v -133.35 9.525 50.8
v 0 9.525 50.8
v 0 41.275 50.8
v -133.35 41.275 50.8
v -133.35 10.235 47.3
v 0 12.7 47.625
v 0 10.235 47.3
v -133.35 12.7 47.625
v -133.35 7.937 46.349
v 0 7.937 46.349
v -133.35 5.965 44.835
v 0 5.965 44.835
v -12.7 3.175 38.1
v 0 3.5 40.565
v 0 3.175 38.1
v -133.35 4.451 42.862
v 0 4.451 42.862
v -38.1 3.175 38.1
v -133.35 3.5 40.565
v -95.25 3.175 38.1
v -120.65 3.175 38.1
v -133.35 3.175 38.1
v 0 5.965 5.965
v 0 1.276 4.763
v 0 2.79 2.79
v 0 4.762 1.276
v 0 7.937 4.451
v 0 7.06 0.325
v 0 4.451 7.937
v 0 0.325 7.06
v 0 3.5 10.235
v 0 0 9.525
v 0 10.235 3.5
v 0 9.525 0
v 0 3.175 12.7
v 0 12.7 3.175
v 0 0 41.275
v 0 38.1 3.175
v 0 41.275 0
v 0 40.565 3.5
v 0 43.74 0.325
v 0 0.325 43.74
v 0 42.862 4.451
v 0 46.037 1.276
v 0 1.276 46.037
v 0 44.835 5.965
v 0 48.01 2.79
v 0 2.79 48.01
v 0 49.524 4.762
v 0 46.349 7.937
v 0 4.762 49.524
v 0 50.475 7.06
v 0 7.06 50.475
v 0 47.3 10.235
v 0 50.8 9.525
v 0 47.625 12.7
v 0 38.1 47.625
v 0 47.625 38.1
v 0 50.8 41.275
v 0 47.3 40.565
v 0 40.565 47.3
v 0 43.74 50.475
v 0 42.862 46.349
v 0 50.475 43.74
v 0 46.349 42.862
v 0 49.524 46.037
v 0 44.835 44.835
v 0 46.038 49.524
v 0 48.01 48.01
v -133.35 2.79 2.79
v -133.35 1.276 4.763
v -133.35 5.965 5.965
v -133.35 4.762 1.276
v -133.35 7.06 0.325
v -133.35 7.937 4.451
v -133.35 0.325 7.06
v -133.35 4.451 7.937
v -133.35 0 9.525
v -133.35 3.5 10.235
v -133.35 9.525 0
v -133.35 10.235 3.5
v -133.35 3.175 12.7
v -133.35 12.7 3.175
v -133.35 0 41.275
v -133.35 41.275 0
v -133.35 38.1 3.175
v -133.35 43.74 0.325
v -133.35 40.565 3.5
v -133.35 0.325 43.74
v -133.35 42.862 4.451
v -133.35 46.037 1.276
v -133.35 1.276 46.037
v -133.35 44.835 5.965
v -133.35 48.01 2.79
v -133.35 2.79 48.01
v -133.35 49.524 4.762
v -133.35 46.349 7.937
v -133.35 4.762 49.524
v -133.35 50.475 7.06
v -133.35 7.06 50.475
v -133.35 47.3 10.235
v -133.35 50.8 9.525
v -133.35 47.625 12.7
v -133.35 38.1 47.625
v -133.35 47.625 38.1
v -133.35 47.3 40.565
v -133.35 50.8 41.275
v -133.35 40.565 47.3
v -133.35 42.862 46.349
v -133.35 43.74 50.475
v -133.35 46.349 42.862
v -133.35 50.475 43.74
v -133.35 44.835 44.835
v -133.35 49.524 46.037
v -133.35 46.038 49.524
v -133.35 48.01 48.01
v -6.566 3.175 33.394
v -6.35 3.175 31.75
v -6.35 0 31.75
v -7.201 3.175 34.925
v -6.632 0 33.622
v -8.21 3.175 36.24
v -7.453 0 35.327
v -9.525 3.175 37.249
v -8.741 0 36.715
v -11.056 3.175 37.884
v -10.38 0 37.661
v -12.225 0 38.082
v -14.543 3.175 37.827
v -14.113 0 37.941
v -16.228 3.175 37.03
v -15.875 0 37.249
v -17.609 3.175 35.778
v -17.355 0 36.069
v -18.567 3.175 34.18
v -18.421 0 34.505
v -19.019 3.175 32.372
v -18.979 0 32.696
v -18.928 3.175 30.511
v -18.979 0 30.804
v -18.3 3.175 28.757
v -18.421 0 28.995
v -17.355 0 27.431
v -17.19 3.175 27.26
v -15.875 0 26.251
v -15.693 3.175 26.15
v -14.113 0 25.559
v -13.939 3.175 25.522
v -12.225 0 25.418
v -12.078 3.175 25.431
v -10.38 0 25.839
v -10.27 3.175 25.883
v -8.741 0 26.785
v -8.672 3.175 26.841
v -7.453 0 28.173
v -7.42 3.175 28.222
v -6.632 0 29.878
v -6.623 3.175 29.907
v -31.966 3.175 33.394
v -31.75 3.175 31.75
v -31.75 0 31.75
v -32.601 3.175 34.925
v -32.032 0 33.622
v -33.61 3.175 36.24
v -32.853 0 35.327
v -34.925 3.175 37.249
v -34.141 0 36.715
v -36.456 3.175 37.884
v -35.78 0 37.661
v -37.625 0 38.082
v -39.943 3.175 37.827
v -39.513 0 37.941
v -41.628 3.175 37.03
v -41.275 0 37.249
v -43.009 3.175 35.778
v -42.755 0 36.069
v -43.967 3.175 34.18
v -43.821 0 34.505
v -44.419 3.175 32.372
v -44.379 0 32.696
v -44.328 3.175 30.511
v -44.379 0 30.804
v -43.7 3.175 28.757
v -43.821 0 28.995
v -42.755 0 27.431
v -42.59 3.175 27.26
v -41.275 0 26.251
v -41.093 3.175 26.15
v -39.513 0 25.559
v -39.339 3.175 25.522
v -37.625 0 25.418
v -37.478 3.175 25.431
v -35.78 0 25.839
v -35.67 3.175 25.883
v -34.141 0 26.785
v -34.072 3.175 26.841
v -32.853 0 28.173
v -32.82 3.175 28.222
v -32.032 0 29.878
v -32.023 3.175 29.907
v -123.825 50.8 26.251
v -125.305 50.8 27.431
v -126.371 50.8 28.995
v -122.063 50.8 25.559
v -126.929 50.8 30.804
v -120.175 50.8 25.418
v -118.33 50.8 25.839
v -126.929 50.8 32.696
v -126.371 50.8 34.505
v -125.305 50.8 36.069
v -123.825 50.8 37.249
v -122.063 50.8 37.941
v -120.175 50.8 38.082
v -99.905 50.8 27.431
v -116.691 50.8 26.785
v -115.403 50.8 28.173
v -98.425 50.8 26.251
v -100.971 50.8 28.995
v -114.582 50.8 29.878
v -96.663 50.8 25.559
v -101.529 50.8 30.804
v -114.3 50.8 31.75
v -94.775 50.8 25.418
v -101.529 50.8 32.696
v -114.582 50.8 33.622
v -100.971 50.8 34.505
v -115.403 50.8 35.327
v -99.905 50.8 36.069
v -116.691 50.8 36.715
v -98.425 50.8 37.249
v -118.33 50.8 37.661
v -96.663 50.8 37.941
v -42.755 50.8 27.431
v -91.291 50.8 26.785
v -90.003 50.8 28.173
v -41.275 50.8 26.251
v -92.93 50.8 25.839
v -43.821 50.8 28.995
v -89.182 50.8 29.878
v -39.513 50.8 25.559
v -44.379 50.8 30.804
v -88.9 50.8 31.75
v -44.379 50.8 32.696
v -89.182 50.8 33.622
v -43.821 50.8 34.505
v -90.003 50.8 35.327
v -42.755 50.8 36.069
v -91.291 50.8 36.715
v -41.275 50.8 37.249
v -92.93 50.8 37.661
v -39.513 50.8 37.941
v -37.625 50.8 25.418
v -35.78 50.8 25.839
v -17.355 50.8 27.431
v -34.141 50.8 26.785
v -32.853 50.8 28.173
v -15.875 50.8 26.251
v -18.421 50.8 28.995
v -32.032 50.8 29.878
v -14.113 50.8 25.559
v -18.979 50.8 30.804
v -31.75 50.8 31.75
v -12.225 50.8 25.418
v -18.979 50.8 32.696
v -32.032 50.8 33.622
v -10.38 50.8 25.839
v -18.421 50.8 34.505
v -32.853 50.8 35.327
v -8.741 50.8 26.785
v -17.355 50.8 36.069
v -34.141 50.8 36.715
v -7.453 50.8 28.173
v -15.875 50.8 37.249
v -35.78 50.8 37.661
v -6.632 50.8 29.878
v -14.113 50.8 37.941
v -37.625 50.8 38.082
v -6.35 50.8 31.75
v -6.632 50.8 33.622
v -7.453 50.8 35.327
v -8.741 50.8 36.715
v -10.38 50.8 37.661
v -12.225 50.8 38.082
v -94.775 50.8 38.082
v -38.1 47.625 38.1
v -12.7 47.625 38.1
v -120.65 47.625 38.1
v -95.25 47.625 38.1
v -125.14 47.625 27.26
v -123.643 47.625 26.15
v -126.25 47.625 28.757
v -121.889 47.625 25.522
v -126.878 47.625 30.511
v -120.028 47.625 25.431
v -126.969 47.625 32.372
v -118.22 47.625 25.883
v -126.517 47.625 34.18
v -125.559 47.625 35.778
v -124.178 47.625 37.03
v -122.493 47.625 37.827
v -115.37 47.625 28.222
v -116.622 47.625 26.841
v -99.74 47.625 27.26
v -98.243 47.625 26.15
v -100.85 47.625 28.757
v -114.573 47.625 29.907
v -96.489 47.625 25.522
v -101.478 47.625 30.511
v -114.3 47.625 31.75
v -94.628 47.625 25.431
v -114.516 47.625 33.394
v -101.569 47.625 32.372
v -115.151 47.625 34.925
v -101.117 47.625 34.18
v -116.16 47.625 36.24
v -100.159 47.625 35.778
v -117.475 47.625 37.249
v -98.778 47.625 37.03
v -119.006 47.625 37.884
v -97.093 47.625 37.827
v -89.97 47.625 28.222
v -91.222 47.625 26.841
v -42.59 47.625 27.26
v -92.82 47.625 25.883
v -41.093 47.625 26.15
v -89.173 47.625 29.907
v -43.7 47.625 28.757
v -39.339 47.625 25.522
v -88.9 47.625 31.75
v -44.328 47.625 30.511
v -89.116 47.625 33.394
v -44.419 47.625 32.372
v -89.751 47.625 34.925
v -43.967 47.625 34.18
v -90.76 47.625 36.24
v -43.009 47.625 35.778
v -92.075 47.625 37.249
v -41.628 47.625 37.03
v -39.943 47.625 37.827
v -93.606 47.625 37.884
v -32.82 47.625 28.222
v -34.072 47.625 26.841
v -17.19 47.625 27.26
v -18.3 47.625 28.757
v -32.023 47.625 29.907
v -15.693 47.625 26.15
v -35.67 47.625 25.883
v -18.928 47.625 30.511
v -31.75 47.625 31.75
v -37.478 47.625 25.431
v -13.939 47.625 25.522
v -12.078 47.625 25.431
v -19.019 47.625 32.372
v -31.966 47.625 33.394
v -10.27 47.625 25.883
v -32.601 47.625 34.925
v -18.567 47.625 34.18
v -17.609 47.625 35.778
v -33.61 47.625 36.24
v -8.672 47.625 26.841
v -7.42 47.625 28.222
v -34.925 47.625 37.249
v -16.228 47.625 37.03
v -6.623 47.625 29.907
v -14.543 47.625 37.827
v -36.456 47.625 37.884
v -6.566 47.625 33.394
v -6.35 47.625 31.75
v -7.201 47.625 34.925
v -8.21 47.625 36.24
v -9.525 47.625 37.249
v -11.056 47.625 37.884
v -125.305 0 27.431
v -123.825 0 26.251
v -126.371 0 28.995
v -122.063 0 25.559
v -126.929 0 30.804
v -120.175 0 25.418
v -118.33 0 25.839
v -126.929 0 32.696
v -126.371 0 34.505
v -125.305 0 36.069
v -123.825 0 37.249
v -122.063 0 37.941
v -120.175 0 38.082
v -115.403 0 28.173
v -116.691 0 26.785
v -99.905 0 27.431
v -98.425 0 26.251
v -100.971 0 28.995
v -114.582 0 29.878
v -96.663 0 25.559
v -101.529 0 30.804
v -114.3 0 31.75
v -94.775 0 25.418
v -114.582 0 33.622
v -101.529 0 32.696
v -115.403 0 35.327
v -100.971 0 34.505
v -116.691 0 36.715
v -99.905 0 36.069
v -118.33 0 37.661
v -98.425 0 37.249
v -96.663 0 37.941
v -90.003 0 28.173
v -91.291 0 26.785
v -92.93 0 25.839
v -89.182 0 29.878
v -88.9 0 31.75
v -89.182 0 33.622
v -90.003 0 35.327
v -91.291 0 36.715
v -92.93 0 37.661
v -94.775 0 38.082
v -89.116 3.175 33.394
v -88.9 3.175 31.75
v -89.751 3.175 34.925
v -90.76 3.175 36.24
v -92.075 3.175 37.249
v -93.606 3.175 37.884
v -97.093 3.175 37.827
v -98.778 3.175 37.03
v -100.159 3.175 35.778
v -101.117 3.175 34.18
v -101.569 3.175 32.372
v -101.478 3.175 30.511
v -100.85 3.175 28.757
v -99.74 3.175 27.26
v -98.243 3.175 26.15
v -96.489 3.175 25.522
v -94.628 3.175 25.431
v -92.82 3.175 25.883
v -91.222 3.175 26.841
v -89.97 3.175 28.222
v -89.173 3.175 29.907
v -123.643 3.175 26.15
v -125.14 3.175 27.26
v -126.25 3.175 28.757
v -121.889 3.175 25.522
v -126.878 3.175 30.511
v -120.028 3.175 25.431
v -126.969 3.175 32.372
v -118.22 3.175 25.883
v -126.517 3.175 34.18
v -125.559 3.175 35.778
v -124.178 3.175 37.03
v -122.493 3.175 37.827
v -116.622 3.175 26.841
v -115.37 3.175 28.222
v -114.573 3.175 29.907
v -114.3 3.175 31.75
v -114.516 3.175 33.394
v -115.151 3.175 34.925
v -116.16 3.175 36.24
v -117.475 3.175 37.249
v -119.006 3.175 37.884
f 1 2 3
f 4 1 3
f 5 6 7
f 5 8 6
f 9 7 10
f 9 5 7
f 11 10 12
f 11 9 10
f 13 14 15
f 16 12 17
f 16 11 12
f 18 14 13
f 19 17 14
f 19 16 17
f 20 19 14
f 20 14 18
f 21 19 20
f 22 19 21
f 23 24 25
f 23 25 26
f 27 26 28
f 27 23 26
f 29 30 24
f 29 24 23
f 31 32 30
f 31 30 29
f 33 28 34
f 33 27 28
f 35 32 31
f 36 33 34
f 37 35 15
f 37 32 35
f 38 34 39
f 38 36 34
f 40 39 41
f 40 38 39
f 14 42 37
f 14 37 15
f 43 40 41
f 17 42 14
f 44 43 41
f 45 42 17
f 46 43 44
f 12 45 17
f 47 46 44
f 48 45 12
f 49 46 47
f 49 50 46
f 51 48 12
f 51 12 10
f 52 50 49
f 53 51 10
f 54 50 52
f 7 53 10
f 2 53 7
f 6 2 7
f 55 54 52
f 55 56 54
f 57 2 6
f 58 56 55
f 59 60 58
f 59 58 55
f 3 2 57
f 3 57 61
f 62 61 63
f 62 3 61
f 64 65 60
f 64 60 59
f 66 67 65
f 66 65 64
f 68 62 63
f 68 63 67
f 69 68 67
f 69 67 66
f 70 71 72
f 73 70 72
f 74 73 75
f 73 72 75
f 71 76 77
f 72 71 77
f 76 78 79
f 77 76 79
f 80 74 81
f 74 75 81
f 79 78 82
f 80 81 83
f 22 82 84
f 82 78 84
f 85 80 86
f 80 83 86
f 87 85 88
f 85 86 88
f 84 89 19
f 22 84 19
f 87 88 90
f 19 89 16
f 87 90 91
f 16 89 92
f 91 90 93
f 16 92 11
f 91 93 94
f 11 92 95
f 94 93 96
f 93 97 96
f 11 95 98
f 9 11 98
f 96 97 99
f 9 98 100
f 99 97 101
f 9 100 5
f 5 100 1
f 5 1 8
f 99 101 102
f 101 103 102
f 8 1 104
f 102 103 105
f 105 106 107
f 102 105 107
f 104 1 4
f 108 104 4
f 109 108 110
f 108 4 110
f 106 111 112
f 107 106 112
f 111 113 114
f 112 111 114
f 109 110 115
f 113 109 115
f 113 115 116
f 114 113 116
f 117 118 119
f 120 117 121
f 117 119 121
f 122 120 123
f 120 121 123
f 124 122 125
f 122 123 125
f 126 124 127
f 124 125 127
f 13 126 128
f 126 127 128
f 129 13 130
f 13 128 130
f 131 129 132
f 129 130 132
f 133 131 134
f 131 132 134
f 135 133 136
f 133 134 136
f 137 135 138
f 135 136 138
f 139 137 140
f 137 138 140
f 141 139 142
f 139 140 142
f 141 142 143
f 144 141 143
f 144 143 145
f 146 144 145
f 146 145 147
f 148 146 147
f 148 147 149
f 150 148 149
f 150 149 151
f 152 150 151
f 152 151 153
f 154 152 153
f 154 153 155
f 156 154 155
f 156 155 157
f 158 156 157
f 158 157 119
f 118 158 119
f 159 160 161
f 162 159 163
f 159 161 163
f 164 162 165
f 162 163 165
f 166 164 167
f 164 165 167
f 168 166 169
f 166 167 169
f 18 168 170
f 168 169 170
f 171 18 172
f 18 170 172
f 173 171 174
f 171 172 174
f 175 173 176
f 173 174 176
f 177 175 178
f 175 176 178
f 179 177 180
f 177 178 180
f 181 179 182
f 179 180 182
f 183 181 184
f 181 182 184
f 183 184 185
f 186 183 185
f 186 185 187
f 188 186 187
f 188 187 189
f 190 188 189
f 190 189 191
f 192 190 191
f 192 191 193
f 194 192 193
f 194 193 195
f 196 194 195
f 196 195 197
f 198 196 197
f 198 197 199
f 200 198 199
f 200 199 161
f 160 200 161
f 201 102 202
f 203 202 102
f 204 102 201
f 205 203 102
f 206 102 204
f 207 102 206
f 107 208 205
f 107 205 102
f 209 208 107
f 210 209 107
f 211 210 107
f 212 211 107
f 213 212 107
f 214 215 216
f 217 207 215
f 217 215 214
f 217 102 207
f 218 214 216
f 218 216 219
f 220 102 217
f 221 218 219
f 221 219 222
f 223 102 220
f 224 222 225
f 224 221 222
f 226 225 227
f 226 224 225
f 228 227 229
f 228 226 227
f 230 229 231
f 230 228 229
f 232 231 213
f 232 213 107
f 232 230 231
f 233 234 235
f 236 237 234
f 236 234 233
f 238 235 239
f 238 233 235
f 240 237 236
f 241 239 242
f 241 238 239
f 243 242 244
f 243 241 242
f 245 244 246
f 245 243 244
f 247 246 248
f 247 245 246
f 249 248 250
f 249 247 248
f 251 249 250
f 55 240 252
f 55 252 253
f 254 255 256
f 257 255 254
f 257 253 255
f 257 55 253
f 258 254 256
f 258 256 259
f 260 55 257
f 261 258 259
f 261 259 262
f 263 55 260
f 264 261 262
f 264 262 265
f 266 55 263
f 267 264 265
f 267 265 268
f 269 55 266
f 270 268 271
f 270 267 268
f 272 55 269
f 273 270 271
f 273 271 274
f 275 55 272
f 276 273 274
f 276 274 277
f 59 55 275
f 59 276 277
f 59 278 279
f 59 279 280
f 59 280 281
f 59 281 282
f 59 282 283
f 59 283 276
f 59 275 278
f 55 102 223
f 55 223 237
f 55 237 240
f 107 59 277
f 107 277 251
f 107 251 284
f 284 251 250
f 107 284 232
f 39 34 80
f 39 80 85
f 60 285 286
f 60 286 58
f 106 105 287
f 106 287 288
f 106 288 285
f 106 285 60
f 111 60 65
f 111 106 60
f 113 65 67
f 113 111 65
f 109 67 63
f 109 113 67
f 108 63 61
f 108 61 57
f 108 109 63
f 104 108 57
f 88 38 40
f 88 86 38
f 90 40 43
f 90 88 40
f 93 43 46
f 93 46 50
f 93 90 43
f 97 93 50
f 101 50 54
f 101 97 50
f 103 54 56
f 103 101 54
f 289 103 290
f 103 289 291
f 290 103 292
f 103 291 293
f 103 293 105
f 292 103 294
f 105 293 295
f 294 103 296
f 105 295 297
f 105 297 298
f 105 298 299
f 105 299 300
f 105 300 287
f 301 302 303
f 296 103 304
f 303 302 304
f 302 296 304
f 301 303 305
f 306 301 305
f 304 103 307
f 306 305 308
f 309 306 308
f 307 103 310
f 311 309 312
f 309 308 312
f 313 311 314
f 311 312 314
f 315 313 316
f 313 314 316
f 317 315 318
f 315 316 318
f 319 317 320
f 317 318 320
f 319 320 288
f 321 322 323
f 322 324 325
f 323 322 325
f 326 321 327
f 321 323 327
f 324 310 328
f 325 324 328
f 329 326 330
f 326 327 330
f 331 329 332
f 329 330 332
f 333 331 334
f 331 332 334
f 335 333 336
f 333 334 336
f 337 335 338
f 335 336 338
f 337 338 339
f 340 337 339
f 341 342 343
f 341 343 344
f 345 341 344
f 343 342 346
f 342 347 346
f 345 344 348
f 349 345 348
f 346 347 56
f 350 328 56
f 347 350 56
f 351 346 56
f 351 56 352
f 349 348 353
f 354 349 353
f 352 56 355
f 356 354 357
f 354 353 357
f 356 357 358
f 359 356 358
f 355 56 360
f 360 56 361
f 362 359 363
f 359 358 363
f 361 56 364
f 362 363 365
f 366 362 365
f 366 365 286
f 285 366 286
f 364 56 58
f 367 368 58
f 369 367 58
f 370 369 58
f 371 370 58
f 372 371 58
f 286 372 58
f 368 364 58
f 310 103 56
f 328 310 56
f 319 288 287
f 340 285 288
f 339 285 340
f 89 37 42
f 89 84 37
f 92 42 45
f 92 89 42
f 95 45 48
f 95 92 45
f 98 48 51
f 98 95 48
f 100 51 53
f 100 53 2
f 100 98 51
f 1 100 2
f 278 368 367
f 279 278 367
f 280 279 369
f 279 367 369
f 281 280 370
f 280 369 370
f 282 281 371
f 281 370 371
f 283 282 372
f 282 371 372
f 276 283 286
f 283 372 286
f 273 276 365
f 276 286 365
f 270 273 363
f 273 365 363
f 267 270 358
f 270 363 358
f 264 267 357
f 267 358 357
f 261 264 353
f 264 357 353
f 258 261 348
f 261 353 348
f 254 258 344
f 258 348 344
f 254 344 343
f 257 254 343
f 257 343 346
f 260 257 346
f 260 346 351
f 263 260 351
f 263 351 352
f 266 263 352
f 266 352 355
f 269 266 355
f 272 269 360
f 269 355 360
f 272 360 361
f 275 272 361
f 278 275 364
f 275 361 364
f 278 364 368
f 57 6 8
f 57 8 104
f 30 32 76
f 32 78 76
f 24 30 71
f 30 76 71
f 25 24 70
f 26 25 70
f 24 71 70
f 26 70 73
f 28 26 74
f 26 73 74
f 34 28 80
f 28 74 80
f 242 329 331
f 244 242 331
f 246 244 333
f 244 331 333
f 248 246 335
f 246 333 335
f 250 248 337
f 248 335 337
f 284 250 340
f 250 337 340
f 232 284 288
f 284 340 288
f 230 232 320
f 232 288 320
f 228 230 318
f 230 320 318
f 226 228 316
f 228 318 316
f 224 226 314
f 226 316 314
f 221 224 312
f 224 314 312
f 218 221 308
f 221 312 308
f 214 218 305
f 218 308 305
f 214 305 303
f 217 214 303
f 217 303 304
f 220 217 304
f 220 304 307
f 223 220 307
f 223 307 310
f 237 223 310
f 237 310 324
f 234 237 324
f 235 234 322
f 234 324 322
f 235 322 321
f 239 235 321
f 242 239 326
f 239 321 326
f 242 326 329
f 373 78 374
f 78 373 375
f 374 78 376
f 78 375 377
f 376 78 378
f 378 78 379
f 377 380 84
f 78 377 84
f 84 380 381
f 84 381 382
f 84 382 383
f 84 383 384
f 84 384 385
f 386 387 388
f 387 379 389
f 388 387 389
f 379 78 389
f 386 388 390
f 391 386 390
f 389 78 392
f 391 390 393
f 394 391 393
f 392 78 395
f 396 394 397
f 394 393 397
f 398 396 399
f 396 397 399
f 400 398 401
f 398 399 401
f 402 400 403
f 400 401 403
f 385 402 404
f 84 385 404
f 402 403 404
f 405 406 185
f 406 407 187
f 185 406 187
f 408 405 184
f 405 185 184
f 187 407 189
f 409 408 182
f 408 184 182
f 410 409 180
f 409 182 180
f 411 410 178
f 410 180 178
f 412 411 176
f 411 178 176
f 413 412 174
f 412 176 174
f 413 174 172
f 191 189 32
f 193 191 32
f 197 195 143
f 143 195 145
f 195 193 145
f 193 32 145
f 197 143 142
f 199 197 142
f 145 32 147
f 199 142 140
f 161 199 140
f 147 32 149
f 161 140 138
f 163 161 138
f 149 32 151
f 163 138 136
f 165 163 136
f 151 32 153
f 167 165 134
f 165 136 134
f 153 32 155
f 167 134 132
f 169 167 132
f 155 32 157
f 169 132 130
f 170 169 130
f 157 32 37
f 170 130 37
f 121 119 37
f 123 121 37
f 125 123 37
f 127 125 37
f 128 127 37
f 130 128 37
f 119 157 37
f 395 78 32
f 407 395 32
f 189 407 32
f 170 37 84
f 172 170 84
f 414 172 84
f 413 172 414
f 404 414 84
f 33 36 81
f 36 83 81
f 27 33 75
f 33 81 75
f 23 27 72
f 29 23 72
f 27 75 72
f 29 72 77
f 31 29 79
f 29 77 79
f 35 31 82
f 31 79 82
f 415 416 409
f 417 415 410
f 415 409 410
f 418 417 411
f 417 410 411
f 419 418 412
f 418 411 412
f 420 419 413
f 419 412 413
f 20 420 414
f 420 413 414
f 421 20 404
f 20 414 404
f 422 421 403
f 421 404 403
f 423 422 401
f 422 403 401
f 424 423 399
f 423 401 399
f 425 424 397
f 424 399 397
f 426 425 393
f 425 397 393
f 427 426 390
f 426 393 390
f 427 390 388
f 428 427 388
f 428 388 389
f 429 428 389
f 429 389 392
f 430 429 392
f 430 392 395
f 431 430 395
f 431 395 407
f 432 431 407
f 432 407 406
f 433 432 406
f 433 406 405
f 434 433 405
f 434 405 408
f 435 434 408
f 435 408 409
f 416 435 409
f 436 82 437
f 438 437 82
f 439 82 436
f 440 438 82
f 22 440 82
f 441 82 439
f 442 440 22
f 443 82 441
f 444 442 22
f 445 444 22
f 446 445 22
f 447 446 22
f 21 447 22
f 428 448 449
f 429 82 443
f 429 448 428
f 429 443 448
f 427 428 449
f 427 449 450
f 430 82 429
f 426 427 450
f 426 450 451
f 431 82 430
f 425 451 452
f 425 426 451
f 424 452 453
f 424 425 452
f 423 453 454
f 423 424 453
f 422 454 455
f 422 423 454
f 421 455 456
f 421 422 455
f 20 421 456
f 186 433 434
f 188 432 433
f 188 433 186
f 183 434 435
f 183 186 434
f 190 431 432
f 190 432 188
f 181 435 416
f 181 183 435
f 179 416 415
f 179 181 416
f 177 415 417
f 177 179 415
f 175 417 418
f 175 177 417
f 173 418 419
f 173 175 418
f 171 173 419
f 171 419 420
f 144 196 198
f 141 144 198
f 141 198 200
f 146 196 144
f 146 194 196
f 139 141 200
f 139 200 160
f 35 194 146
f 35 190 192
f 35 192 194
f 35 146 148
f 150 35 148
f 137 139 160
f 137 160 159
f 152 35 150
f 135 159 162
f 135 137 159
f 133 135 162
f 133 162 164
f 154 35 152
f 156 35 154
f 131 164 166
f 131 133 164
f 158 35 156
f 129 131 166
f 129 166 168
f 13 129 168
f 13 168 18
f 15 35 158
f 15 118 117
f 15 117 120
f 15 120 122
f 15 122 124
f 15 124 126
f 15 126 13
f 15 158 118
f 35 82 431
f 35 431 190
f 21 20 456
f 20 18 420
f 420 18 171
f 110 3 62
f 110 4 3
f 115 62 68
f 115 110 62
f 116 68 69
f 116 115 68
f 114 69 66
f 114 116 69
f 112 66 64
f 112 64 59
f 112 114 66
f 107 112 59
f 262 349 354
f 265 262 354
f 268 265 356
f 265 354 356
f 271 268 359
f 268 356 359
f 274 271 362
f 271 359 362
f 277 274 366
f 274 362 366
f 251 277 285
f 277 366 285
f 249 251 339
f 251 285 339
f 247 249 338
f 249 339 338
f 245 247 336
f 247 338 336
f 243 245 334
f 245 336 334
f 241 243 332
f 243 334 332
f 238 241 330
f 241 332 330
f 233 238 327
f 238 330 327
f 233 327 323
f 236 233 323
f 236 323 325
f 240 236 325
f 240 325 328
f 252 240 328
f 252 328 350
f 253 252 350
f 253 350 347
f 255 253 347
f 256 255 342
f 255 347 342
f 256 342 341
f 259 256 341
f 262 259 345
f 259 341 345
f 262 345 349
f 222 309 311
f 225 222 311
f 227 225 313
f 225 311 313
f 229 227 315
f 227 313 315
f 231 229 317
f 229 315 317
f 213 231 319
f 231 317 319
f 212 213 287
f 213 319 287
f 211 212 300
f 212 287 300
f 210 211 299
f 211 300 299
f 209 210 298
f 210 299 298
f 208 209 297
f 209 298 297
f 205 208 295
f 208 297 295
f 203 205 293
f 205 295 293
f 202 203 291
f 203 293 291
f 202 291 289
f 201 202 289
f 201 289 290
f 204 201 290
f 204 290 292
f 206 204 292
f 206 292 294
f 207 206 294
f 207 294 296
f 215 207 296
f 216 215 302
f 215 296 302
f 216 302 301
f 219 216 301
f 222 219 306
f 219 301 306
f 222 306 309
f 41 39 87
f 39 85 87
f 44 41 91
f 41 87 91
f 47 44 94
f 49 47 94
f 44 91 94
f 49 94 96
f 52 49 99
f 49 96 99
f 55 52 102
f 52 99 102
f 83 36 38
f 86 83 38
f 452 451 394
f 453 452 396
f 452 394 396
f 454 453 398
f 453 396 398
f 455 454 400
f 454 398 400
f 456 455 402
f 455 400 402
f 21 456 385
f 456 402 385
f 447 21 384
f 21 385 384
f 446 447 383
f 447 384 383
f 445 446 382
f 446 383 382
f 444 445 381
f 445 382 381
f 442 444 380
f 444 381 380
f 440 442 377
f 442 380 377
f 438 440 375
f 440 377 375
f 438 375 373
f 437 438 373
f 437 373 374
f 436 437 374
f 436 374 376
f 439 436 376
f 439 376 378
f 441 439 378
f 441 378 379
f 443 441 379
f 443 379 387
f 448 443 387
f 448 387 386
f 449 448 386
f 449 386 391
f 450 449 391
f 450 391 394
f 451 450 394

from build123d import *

# Parameters (mm, degrees)
F0_W     = 50.8
F0_H     = 50.8
F1_DEPTH = 133.35
F2_W     = 44.45
F2_H     = 44.45
F3_DEPTH = 876.3
F4_R     = 9.525
F6_D     = 12.7
F6_DEPTH = 127


with BuildPart() as f1:
    # F0 (on Right) → F1 (new body)
    with BuildSketch(Plane.YZ):
        with Locations((25.4, 25.4)):
            Rectangle(F0_W, F0_H)
    extrude(amount=-F1_DEPTH)

    # F2 (on face) → F3 (cut)
    with BuildSketch(Plane.YZ):
        with Locations((25.4, 25.4)):
            Rectangle(F2_W, F2_H)
    extrude(amount=-F3_DEPTH, mode=Mode.SUBTRACT)

    # F4
    f4_edges = [f1.edges().sort_by_distance(p)[0] for p in [
        (-66.675, 3.175, 3.175),
        (-66.675, 47.625, 3.175),
        (-66.675, 47.625, 47.625),
        (-66.675, 3.175, 47.625),
        (-66.675, 50.8, 0),
        (-66.675, 50.8, 50.8),
        (-66.675, 0, 50.8),
        (-66.675, 0, 0),
    ]]
    fillet(f4_edges, radius=F4_R)

    # F6
    with Locations(Plane(origin=(0, 50.8, 0), x_dir=(-1, 0, 0), z_dir=(0, 1, 0))):
        with Locations((120.65, 31.75), (95.25, 31.75), (38.1, 31.75), (12.7, 31.75)):
            Hole(F6_D / 2, depth=F6_DEPTH)


solid = f1.part
